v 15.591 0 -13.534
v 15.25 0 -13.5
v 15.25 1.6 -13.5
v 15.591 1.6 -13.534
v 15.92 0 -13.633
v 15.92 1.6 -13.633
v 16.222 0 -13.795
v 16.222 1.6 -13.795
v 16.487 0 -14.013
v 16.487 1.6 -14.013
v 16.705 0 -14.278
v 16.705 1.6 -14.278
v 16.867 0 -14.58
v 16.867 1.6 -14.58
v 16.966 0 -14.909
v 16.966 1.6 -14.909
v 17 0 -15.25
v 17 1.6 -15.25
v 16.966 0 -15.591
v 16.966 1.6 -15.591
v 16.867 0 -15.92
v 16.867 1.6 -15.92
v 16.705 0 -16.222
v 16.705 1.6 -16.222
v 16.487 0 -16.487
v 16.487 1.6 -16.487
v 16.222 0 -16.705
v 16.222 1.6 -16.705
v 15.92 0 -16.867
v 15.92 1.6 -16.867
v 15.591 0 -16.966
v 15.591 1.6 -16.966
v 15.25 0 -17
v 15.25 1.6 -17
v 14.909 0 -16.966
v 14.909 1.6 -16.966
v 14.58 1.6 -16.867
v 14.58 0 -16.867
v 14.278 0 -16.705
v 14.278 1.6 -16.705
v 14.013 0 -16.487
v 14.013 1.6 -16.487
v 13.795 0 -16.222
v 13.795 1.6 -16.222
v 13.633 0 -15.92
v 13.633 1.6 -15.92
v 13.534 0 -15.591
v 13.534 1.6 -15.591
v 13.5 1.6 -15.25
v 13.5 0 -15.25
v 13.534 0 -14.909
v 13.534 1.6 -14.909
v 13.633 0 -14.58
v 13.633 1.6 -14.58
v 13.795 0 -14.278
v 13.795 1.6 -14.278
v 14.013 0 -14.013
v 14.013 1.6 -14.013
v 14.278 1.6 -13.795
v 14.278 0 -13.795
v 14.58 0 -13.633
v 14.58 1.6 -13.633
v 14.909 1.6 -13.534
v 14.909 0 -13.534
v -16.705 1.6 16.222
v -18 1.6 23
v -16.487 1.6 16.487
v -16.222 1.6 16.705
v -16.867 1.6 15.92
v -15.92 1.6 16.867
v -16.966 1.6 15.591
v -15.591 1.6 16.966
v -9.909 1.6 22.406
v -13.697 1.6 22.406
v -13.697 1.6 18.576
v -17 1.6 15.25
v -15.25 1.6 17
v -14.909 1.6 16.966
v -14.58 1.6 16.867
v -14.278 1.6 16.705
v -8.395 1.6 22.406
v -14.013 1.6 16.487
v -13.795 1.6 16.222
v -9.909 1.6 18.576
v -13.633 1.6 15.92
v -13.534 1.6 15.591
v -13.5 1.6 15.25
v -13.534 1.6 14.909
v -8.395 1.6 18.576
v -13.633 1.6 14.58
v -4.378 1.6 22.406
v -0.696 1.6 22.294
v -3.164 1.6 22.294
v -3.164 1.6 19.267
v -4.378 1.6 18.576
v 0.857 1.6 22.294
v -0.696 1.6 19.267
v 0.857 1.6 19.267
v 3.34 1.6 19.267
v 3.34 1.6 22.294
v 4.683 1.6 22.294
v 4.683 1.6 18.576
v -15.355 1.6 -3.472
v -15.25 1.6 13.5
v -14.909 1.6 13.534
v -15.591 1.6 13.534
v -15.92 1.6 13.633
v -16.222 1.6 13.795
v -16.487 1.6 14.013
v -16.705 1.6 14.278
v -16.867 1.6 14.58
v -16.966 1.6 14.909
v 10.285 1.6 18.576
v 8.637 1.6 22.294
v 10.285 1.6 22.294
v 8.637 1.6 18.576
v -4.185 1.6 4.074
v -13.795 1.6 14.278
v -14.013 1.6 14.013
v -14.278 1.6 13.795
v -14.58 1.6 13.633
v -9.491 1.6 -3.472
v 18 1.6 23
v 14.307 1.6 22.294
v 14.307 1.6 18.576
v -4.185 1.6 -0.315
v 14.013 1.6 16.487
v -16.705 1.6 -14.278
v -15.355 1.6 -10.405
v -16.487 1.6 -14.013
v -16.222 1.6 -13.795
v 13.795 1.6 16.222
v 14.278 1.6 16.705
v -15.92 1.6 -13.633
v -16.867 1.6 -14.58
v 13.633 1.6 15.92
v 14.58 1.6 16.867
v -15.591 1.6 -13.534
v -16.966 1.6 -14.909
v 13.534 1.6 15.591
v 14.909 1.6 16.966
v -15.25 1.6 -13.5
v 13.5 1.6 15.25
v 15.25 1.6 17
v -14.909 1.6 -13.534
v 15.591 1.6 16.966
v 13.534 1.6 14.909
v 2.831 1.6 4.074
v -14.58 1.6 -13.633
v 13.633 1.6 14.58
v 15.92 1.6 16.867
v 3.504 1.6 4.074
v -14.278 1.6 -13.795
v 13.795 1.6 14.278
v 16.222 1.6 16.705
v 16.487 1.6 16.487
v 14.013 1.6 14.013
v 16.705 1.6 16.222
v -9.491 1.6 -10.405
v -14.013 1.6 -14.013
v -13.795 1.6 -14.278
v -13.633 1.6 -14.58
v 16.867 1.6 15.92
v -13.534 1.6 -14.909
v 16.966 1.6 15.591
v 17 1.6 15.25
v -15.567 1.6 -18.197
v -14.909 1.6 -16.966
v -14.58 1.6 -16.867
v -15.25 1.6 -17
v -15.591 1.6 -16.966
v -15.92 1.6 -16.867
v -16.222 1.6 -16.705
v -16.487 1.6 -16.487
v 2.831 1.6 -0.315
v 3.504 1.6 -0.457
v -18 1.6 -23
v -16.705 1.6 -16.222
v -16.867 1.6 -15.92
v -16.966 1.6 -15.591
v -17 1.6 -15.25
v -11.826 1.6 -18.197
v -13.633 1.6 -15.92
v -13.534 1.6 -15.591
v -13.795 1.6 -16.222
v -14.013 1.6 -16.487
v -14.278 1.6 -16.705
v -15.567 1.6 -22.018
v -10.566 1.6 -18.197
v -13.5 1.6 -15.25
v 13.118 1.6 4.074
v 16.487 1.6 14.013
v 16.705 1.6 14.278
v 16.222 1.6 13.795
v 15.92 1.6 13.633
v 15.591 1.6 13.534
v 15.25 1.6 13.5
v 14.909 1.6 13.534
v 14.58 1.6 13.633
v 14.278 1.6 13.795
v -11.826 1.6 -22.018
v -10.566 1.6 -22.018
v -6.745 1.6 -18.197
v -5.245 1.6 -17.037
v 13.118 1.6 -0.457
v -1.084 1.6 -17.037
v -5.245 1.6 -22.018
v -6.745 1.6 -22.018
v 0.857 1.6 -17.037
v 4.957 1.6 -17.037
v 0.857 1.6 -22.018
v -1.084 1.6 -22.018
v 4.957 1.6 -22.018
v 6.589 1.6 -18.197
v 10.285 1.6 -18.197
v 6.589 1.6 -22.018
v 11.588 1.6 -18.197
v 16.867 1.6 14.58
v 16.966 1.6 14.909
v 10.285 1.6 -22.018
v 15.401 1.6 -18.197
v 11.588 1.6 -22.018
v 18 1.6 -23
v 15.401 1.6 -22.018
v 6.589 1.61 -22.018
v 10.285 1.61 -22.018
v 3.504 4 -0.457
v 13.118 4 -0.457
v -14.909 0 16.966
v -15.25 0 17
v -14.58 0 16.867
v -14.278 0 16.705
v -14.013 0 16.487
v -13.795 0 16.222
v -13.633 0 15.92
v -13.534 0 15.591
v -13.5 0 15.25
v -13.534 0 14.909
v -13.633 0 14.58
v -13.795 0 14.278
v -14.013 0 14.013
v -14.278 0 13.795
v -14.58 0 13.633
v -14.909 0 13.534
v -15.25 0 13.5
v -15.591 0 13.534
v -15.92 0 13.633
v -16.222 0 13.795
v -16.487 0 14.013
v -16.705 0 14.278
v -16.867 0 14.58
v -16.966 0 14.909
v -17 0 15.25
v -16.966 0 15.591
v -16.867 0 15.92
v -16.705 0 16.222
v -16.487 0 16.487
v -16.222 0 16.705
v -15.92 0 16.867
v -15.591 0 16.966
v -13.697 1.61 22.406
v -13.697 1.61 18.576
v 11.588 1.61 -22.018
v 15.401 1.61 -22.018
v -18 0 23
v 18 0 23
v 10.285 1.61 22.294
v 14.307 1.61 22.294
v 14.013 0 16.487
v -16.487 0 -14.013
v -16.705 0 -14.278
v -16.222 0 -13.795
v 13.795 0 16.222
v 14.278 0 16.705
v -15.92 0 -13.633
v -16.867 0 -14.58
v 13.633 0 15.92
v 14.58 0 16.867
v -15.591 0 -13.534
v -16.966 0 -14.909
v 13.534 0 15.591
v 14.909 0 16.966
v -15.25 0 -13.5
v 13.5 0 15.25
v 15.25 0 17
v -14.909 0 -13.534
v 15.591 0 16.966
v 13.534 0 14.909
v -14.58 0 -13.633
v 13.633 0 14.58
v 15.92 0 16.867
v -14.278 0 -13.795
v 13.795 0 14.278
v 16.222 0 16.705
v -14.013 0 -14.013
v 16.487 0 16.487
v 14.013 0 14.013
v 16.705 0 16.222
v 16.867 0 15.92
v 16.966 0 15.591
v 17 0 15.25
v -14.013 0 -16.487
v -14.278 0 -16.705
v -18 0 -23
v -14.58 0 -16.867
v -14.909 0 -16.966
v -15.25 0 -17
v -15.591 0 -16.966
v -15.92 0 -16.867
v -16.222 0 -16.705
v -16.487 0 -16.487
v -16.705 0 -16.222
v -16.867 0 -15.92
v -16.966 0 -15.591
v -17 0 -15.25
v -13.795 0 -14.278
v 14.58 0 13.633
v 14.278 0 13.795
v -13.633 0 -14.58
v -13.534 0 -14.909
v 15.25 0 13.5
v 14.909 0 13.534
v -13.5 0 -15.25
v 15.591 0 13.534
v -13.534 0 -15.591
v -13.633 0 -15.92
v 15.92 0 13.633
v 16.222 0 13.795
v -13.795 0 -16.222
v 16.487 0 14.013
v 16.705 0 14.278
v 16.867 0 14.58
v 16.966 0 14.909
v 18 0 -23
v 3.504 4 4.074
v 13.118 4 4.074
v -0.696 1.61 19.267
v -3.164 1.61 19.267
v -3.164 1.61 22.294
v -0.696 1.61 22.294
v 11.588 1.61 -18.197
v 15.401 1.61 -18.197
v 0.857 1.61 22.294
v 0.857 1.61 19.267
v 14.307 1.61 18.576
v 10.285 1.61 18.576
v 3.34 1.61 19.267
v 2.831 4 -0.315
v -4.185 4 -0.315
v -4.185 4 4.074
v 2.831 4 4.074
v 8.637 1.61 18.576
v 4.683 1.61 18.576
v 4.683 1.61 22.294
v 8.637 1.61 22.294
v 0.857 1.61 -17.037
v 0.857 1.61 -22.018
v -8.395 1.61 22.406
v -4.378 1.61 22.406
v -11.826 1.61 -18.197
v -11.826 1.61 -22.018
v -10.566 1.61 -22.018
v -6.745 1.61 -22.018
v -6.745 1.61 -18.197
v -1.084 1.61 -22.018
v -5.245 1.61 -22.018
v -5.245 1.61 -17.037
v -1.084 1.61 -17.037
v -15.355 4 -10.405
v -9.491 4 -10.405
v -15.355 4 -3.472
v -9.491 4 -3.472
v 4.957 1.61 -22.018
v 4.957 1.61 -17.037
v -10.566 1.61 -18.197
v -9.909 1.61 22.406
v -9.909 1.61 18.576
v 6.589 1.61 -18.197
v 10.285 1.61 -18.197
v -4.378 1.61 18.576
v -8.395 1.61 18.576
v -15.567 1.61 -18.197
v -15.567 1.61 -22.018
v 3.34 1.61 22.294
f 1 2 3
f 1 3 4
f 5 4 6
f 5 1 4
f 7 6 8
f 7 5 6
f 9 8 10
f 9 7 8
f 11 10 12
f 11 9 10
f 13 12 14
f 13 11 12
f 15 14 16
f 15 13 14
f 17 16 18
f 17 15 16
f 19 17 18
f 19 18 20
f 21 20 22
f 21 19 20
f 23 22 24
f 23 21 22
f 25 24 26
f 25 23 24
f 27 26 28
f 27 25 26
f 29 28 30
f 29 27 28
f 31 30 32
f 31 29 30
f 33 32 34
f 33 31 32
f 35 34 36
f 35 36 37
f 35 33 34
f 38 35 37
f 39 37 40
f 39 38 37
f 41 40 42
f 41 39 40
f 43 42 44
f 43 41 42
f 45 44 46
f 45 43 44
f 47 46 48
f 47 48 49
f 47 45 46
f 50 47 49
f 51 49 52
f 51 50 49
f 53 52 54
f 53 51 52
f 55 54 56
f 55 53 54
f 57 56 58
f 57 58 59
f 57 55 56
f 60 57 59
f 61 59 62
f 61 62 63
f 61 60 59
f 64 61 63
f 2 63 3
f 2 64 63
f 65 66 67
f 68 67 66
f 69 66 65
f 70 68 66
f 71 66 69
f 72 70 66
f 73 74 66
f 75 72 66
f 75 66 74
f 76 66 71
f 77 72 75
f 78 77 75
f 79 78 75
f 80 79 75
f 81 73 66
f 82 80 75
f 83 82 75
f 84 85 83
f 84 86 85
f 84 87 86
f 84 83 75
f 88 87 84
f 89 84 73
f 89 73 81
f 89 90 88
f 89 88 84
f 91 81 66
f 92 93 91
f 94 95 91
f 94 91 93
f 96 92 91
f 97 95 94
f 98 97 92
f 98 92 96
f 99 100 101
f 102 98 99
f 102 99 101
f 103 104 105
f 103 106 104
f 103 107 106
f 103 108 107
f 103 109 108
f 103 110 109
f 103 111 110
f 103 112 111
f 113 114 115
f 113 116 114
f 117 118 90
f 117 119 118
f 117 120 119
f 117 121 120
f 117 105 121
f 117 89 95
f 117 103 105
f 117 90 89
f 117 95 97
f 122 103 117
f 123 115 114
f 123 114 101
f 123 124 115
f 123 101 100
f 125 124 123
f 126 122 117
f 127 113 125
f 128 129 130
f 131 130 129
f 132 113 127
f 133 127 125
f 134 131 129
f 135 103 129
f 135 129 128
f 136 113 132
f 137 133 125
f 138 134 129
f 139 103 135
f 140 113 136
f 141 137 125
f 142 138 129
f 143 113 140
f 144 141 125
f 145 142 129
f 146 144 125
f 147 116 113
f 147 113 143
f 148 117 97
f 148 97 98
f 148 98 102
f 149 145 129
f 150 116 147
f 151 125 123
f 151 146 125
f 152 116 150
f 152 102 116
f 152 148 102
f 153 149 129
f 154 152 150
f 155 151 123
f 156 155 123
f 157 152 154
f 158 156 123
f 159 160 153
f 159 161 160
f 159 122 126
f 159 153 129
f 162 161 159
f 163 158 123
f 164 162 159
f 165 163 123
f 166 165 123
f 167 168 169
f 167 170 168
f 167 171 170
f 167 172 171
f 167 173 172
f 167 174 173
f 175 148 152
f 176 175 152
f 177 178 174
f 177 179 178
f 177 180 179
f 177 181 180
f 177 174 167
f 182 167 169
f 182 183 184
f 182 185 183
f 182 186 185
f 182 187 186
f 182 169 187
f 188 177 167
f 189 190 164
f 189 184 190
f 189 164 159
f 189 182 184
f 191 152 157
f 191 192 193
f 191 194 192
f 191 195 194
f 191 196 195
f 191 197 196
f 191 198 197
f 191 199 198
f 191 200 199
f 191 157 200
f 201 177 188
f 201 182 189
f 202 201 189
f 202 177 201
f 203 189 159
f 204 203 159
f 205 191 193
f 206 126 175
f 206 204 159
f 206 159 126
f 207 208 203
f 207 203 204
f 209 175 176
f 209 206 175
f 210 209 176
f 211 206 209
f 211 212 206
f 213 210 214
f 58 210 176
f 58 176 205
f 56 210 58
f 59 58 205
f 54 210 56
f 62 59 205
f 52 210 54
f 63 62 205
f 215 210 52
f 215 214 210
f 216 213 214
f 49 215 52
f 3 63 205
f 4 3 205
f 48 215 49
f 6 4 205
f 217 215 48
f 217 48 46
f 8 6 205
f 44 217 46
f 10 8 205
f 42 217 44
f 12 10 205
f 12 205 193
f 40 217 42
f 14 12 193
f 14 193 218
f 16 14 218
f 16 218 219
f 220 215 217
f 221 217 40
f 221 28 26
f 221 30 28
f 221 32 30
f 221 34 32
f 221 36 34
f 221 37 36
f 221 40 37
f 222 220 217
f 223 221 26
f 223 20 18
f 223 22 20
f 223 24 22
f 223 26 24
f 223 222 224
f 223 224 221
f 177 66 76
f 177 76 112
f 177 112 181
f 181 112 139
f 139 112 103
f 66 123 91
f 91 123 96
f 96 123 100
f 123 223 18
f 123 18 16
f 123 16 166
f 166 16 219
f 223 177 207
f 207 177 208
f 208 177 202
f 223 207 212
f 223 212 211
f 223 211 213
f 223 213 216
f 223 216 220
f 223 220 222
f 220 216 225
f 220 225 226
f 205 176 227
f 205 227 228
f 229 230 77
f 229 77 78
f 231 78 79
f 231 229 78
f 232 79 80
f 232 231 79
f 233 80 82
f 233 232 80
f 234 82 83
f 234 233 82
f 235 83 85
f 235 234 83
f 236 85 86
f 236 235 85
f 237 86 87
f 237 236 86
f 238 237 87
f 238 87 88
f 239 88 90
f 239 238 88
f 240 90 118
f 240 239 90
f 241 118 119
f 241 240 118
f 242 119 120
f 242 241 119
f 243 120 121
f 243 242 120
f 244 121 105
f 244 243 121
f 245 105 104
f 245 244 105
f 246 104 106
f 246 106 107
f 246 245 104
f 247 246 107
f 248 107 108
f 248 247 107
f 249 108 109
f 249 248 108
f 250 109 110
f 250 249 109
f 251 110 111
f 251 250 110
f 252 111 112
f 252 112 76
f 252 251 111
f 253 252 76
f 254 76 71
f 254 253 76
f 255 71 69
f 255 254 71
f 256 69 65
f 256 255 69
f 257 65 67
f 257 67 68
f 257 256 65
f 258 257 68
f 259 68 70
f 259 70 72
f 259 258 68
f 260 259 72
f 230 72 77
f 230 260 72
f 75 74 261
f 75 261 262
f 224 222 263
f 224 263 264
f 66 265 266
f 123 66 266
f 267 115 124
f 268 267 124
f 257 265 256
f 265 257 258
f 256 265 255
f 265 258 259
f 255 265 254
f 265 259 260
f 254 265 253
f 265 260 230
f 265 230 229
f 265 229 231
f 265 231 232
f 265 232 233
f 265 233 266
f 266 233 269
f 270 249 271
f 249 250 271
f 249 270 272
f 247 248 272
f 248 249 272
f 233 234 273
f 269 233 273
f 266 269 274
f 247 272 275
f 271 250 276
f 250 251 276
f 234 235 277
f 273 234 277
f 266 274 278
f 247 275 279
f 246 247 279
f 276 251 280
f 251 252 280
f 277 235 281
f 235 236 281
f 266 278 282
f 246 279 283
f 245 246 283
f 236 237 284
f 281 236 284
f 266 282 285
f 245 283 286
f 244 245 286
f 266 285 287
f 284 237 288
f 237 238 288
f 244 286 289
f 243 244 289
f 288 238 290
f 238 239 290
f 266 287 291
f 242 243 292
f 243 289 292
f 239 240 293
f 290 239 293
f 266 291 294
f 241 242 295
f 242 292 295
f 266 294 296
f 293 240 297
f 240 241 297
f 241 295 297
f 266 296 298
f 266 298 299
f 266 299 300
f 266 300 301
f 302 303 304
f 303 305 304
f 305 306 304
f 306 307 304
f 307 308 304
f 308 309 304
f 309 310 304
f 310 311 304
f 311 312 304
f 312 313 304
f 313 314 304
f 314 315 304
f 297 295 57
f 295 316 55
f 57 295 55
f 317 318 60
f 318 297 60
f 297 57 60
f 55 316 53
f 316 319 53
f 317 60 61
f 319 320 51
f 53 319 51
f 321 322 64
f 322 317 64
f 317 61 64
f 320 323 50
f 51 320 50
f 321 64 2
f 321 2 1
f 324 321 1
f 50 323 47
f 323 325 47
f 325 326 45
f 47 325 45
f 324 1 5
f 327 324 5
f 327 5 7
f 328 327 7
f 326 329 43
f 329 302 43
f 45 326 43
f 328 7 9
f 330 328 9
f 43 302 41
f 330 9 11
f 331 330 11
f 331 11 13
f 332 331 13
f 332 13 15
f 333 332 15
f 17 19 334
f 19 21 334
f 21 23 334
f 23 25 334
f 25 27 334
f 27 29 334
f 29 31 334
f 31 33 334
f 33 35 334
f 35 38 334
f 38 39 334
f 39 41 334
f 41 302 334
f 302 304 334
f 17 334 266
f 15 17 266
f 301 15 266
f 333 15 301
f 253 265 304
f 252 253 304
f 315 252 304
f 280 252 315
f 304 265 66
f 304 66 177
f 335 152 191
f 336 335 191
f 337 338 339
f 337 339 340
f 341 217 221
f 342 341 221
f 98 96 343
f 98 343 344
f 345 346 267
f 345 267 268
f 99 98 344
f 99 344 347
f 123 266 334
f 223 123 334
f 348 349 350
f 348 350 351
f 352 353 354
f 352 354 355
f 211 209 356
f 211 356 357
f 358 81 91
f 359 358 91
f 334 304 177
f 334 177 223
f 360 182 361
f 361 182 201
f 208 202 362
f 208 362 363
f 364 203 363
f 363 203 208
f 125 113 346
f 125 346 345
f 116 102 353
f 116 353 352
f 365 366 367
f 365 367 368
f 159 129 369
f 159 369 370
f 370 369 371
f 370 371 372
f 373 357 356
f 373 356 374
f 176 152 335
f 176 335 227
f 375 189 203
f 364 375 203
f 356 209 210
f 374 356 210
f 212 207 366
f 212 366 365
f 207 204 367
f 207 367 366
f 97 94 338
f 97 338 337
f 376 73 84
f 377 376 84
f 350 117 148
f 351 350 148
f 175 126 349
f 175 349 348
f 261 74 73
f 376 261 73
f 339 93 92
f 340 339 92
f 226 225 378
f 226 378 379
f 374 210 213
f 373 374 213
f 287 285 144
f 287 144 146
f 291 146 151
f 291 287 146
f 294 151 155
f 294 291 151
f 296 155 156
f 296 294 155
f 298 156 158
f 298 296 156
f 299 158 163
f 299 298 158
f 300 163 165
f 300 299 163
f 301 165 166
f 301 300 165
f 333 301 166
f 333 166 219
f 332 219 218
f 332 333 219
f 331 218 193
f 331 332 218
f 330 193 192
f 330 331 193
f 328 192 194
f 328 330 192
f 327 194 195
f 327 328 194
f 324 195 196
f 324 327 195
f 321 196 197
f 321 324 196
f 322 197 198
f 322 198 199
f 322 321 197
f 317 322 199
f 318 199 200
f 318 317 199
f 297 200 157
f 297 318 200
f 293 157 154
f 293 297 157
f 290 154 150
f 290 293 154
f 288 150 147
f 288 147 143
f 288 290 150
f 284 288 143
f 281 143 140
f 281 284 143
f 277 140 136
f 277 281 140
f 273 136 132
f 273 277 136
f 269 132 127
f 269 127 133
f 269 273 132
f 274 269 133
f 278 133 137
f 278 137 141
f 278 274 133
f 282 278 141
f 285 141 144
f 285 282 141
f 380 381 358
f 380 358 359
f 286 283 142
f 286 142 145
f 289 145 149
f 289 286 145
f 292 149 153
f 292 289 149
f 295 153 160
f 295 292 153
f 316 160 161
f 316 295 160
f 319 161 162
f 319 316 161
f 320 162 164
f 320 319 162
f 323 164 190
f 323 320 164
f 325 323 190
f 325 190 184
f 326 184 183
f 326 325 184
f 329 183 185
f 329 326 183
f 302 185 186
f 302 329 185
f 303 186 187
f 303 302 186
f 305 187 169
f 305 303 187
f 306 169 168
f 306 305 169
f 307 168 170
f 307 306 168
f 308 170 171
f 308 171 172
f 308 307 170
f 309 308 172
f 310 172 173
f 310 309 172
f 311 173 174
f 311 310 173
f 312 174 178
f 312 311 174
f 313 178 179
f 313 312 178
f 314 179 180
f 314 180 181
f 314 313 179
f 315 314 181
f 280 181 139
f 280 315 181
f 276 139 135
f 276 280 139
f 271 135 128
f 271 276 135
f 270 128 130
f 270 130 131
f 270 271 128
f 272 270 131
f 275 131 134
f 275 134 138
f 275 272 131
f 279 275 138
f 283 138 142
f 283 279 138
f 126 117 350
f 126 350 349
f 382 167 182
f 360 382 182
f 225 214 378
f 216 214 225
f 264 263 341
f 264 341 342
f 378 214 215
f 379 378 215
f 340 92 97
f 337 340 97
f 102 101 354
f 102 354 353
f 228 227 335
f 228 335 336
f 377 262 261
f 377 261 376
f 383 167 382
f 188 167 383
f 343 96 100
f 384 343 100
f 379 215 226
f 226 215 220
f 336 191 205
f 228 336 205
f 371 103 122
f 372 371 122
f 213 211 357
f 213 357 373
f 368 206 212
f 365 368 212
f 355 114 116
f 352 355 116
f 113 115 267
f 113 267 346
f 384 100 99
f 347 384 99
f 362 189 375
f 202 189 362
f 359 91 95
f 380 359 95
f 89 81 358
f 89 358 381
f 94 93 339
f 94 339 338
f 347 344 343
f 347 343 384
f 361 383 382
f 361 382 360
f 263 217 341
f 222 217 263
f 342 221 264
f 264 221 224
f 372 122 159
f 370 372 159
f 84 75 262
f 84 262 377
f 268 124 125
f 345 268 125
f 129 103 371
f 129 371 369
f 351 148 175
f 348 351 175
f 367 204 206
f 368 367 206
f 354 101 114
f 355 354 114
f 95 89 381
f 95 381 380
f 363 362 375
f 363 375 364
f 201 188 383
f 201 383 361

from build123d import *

# Parameters (mm, degrees)
SKETCH1_W        = 36
SKETCH1_H        = 5
SKETCH1_H_2      = 36
SKETCH1_R        = 1.75
PCB_DEPTH        = 1.6
SKETCH4_W        = 3.740798036
SKETCH4_H        = 3.820815106
SKETCH4_W_2      = 3.820815106
SKETCH4_W_3      = 4.160887655
SKETCH4_H_2      = 4.981062625
SKETCH4_W_4      = 4.100874852
SKETCH4_W_5      = 3.695656728
SKETCH4_W_6      = 3.812361676
SKETCH4_W_7      = 3.787546171
SKETCH4_H_3      = 3.830762868
SKETCH4_W_8      = 4.01762935
SKETCH4_W_9      = 2.467816827
SKETCH4_H_4      = 3.027236998
SKETCH4_W_10     = 2.483275044
SKETCH4_W_11     = 3.953731944
SKETCH4_H_5      = 3.718642979
SKETCH4_W_12     = 4.022264052
PADS_DEPTH       = 0.01
SKETCH2_W        = 5.863870515
SKETCH2_H        = 6.933382723
SKETCH2_W_2      = 7.016073618
SKETCH2_H_2      = 4.389541424
SKETCH2_W_3      = 9.613875512
SKETCH2_H_3      = 4.530712508
COMPONENTS_DEPTH = 2.4


with BuildPart() as part:
    # Sketch1 → PCB (new body)
    # profile 1 of 3: a face of its own
    with BuildSketch(Plane(origin=(0, 0, 0), x_dir=(1, 0, 0), z_dir=(0, 1, 0))):
        with Locations((0, 20.5)):
            Rectangle(SKETCH1_W, SKETCH1_H)
    # profile 2 of 3: a face of its own
    with BuildSketch(Plane(origin=(0, 0, 0), x_dir=(1, 0, 0), z_dir=(0, 1, 0))):
        Rectangle(SKETCH1_W, SKETCH1_H_2)
        with Locations(Location((-15.25, -15.25, 0), (0, 0, 270))):
            Circle(SKETCH1_R, mode=Mode.SUBTRACT)
        with Locations(Location((15.25, -15.25, 0), (0, 0, 270))):
            Circle(SKETCH1_R, mode=Mode.SUBTRACT)
        with Locations(Location((-15.25, 15.25, 0), (0, 0, 270))):
            Circle(SKETCH1_R, mode=Mode.SUBTRACT)
        with Locations(Location((15.25, 15.25, 0), (0, 0, 270))):
            Circle(SKETCH1_R, mode=Mode.SUBTRACT)
    # profile 3 of 3: a face of its own
    with BuildSketch(Plane(origin=(0, 0, 0), x_dir=(1, 0, 0), z_dir=(0, 1, 0))):
        with Locations((0, -20.5)):
            Rectangle(SKETCH1_W, SKETCH1_H)
    extrude(amount=PCB_DEPTH)

    # Sketch4 → Pads (add)
    with BuildSketch(Plane(origin=(0, 1.6, 0), x_dir=(1, 0, 0), z_dir=(0, 1, 0))):
        with Locations((-13.696501098, 20.107722338)):
            Rectangle(SKETCH4_W, SKETCH4_H)
        with Locations((-8.65542567, 20.107722338)):
            Rectangle(SKETCH4_W_2, SKETCH4_H)
        with Locations((-3.164254223, 19.527598579)):
            Rectangle(SKETCH4_W_3, SKETCH4_H_2)
        with Locations((2.907040985, 19.527598579)):
            Rectangle(SKETCH4_W_4, SKETCH4_H_2)
        with Locations((8.437153549, 20.107722338)):
            Rectangle(SKETCH4_W_5, SKETCH4_H)
        with Locations((13.494368018, 20.107722338)):
            Rectangle(SKETCH4_W_6, SKETCH4_H)
        with Locations((-11.802728013, -20.491019937)):
            Rectangle(SKETCH4_W_7, SKETCH4_H_3)
        with Locations((-6.386521753, -20.491019937)):
            Rectangle(SKETCH4_W_8, SKETCH4_H_3)
        with Locations((-1.930345809, -20.780662983)):
            Rectangle(SKETCH4_W_9, SKETCH4_H_4)
        with Locations((2.098241081, -20.780662983)):
            Rectangle(SKETCH4_W_10, SKETCH4_H_4)
        with Locations((6.660299296, -20.434959993)):
            Rectangle(SKETCH4_W_11, SKETCH4_H_5)
        with Locations((12.296113939, -20.434959993)):
            Rectangle(SKETCH4_W_12, SKETCH4_H_5)
    extrude(amount=PADS_DEPTH)

    # Sketch2 → Components (add)
    with BuildSketch(Plane(origin=(0, 1.6, 0), x_dir=(1, 0, 0), z_dir=(0, 1, 0))):
        with Locations((-12.422852881, 6.938659117)):
            Rectangle(SKETCH2_W, SKETCH2_H)
        with Locations((-0.676707896, -1.879325534)):
            Rectangle(SKETCH2_W_2, SKETCH2_H_2)
        with Locations((8.311019041, -1.808739992)):
            Rectangle(SKETCH2_W_3, SKETCH2_H_3)
    extrude(amount=COMPONENTS_DEPTH)


solid = part.part
